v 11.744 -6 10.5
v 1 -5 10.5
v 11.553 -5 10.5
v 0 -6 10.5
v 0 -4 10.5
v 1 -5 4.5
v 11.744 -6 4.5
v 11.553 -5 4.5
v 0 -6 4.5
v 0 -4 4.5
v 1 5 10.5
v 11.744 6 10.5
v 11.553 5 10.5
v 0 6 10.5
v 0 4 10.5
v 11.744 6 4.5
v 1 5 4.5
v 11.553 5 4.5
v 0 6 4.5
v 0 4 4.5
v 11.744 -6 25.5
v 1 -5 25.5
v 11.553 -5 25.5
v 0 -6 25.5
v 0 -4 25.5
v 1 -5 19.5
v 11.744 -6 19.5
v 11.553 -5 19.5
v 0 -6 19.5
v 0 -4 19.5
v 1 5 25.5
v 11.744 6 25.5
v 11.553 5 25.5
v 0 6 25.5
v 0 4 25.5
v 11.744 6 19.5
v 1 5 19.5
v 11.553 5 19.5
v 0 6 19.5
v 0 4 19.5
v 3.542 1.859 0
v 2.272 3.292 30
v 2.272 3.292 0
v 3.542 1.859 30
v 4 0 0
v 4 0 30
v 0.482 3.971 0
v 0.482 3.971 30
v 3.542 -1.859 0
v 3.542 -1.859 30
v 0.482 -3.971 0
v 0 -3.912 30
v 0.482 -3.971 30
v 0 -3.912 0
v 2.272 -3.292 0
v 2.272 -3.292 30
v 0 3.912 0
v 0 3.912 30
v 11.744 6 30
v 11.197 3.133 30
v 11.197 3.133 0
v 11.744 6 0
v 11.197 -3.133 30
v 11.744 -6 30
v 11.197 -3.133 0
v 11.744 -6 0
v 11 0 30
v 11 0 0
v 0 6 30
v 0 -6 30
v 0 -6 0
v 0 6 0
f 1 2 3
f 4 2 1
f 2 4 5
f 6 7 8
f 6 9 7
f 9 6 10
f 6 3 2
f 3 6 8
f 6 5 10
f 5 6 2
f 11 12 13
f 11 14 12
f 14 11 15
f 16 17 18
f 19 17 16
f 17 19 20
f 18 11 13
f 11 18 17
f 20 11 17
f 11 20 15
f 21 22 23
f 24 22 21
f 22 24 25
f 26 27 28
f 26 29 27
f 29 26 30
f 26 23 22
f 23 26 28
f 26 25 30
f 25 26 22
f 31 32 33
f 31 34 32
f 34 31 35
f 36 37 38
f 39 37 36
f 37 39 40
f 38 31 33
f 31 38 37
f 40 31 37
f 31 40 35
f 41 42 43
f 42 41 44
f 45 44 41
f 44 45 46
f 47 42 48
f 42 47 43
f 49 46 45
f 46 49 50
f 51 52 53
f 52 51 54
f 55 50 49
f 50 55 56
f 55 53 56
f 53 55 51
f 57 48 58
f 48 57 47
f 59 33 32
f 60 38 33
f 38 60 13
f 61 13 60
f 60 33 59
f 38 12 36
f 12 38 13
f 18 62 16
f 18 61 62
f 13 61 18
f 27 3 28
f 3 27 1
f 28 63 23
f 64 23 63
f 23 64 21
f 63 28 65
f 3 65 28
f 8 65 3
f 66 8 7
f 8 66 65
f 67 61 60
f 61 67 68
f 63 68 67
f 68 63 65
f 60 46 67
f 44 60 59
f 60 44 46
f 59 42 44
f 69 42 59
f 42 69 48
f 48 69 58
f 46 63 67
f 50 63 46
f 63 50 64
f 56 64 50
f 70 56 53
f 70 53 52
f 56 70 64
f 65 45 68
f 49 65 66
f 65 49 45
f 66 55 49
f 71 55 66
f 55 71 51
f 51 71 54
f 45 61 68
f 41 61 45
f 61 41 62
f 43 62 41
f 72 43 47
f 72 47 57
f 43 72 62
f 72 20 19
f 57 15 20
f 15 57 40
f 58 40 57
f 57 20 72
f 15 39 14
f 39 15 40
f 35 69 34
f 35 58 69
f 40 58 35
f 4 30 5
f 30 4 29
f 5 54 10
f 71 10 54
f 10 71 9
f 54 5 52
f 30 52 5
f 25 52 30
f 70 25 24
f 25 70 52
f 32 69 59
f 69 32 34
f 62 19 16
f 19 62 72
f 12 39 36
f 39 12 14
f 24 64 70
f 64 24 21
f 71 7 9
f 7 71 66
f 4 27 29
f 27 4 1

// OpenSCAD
/*[ Options ]*/
// Sensor groove diameter. Recommend sensor diameter + 2
SensorGrooveDiameter = 8;

// Holder length
HolderLength = 30;

// Holder thickness
HolderThickness = 12;

// Distance
Distance = 11;

// Bend radius
BendRadius = 25;

// Number of grooves
NumGrooves = 2;

// Groove width. Recommend zip tie width + 1
GrooveWidth = 6;

// Groove depth
GrooveDepth = 2;


ClearanceNeeded = Distance + SensorGrooveDiameter + GrooveDepth;
echo(ClearanceNeeded=ClearanceNeeded);

difference() {
    // Bounding box:
    // Distance + BendRadius x HolderThickness x HolderLength
    BboxX = Distance + BendRadius;
    BboxY = HolderThickness;
    translate([0, -BboxY/2, 0])
        cube([BboxX, BboxY, HolderLength]);

    union() {
        // Sensor cut-out
        translate([0, 0, -HolderLength / 2])
            cylinder(h=HolderLength * 2, d=SensorGrooveDiameter);
        // Attachment cut-out
        translate([Distance + BendRadius, 0, -HolderLength / 2])
            cylinder(h=HolderLength * 2, r=BendRadius, $fn=50);

        // Cut-out grooves
        if (NumGrooves >= 1) {
            GrooveSpacingZ = HolderLength / NumGrooves;
            for (i = [0 : NumGrooves-1]) {
                GrooveZ = GrooveSpacingZ * (0.5 + i);
                for (y = [-1, 1]) {
                    GrooveY = y * HolderThickness / 2;

                    // Long groove
                    translate([0, GrooveY, GrooveZ])
                        cube([BboxX * 2, GrooveDepth, GrooveWidth], center=true);
                    // Diagonal cut
                    CutWidth = HolderThickness / 2 - SensorGrooveDiameter / 2 - GrooveDepth / 2;
                    CutOuterY = y * (HolderThickness / 2 - GrooveDepth / 2);
                    translate([0, CutOuterY, GrooveZ])
                        rotate([0, 0, 45])
                        cube([CutWidth * sqrt(2), CutWidth * sqrt(2), GrooveWidth], center=true);
                    // Cut slightly into sensor space
                    //translate([0, GrooveY, GrooveZ])
                    //    cube([SensorDiameter / 2, BboxY, GrooveWidth], center=true);
                }
            }
        }
    }
}
